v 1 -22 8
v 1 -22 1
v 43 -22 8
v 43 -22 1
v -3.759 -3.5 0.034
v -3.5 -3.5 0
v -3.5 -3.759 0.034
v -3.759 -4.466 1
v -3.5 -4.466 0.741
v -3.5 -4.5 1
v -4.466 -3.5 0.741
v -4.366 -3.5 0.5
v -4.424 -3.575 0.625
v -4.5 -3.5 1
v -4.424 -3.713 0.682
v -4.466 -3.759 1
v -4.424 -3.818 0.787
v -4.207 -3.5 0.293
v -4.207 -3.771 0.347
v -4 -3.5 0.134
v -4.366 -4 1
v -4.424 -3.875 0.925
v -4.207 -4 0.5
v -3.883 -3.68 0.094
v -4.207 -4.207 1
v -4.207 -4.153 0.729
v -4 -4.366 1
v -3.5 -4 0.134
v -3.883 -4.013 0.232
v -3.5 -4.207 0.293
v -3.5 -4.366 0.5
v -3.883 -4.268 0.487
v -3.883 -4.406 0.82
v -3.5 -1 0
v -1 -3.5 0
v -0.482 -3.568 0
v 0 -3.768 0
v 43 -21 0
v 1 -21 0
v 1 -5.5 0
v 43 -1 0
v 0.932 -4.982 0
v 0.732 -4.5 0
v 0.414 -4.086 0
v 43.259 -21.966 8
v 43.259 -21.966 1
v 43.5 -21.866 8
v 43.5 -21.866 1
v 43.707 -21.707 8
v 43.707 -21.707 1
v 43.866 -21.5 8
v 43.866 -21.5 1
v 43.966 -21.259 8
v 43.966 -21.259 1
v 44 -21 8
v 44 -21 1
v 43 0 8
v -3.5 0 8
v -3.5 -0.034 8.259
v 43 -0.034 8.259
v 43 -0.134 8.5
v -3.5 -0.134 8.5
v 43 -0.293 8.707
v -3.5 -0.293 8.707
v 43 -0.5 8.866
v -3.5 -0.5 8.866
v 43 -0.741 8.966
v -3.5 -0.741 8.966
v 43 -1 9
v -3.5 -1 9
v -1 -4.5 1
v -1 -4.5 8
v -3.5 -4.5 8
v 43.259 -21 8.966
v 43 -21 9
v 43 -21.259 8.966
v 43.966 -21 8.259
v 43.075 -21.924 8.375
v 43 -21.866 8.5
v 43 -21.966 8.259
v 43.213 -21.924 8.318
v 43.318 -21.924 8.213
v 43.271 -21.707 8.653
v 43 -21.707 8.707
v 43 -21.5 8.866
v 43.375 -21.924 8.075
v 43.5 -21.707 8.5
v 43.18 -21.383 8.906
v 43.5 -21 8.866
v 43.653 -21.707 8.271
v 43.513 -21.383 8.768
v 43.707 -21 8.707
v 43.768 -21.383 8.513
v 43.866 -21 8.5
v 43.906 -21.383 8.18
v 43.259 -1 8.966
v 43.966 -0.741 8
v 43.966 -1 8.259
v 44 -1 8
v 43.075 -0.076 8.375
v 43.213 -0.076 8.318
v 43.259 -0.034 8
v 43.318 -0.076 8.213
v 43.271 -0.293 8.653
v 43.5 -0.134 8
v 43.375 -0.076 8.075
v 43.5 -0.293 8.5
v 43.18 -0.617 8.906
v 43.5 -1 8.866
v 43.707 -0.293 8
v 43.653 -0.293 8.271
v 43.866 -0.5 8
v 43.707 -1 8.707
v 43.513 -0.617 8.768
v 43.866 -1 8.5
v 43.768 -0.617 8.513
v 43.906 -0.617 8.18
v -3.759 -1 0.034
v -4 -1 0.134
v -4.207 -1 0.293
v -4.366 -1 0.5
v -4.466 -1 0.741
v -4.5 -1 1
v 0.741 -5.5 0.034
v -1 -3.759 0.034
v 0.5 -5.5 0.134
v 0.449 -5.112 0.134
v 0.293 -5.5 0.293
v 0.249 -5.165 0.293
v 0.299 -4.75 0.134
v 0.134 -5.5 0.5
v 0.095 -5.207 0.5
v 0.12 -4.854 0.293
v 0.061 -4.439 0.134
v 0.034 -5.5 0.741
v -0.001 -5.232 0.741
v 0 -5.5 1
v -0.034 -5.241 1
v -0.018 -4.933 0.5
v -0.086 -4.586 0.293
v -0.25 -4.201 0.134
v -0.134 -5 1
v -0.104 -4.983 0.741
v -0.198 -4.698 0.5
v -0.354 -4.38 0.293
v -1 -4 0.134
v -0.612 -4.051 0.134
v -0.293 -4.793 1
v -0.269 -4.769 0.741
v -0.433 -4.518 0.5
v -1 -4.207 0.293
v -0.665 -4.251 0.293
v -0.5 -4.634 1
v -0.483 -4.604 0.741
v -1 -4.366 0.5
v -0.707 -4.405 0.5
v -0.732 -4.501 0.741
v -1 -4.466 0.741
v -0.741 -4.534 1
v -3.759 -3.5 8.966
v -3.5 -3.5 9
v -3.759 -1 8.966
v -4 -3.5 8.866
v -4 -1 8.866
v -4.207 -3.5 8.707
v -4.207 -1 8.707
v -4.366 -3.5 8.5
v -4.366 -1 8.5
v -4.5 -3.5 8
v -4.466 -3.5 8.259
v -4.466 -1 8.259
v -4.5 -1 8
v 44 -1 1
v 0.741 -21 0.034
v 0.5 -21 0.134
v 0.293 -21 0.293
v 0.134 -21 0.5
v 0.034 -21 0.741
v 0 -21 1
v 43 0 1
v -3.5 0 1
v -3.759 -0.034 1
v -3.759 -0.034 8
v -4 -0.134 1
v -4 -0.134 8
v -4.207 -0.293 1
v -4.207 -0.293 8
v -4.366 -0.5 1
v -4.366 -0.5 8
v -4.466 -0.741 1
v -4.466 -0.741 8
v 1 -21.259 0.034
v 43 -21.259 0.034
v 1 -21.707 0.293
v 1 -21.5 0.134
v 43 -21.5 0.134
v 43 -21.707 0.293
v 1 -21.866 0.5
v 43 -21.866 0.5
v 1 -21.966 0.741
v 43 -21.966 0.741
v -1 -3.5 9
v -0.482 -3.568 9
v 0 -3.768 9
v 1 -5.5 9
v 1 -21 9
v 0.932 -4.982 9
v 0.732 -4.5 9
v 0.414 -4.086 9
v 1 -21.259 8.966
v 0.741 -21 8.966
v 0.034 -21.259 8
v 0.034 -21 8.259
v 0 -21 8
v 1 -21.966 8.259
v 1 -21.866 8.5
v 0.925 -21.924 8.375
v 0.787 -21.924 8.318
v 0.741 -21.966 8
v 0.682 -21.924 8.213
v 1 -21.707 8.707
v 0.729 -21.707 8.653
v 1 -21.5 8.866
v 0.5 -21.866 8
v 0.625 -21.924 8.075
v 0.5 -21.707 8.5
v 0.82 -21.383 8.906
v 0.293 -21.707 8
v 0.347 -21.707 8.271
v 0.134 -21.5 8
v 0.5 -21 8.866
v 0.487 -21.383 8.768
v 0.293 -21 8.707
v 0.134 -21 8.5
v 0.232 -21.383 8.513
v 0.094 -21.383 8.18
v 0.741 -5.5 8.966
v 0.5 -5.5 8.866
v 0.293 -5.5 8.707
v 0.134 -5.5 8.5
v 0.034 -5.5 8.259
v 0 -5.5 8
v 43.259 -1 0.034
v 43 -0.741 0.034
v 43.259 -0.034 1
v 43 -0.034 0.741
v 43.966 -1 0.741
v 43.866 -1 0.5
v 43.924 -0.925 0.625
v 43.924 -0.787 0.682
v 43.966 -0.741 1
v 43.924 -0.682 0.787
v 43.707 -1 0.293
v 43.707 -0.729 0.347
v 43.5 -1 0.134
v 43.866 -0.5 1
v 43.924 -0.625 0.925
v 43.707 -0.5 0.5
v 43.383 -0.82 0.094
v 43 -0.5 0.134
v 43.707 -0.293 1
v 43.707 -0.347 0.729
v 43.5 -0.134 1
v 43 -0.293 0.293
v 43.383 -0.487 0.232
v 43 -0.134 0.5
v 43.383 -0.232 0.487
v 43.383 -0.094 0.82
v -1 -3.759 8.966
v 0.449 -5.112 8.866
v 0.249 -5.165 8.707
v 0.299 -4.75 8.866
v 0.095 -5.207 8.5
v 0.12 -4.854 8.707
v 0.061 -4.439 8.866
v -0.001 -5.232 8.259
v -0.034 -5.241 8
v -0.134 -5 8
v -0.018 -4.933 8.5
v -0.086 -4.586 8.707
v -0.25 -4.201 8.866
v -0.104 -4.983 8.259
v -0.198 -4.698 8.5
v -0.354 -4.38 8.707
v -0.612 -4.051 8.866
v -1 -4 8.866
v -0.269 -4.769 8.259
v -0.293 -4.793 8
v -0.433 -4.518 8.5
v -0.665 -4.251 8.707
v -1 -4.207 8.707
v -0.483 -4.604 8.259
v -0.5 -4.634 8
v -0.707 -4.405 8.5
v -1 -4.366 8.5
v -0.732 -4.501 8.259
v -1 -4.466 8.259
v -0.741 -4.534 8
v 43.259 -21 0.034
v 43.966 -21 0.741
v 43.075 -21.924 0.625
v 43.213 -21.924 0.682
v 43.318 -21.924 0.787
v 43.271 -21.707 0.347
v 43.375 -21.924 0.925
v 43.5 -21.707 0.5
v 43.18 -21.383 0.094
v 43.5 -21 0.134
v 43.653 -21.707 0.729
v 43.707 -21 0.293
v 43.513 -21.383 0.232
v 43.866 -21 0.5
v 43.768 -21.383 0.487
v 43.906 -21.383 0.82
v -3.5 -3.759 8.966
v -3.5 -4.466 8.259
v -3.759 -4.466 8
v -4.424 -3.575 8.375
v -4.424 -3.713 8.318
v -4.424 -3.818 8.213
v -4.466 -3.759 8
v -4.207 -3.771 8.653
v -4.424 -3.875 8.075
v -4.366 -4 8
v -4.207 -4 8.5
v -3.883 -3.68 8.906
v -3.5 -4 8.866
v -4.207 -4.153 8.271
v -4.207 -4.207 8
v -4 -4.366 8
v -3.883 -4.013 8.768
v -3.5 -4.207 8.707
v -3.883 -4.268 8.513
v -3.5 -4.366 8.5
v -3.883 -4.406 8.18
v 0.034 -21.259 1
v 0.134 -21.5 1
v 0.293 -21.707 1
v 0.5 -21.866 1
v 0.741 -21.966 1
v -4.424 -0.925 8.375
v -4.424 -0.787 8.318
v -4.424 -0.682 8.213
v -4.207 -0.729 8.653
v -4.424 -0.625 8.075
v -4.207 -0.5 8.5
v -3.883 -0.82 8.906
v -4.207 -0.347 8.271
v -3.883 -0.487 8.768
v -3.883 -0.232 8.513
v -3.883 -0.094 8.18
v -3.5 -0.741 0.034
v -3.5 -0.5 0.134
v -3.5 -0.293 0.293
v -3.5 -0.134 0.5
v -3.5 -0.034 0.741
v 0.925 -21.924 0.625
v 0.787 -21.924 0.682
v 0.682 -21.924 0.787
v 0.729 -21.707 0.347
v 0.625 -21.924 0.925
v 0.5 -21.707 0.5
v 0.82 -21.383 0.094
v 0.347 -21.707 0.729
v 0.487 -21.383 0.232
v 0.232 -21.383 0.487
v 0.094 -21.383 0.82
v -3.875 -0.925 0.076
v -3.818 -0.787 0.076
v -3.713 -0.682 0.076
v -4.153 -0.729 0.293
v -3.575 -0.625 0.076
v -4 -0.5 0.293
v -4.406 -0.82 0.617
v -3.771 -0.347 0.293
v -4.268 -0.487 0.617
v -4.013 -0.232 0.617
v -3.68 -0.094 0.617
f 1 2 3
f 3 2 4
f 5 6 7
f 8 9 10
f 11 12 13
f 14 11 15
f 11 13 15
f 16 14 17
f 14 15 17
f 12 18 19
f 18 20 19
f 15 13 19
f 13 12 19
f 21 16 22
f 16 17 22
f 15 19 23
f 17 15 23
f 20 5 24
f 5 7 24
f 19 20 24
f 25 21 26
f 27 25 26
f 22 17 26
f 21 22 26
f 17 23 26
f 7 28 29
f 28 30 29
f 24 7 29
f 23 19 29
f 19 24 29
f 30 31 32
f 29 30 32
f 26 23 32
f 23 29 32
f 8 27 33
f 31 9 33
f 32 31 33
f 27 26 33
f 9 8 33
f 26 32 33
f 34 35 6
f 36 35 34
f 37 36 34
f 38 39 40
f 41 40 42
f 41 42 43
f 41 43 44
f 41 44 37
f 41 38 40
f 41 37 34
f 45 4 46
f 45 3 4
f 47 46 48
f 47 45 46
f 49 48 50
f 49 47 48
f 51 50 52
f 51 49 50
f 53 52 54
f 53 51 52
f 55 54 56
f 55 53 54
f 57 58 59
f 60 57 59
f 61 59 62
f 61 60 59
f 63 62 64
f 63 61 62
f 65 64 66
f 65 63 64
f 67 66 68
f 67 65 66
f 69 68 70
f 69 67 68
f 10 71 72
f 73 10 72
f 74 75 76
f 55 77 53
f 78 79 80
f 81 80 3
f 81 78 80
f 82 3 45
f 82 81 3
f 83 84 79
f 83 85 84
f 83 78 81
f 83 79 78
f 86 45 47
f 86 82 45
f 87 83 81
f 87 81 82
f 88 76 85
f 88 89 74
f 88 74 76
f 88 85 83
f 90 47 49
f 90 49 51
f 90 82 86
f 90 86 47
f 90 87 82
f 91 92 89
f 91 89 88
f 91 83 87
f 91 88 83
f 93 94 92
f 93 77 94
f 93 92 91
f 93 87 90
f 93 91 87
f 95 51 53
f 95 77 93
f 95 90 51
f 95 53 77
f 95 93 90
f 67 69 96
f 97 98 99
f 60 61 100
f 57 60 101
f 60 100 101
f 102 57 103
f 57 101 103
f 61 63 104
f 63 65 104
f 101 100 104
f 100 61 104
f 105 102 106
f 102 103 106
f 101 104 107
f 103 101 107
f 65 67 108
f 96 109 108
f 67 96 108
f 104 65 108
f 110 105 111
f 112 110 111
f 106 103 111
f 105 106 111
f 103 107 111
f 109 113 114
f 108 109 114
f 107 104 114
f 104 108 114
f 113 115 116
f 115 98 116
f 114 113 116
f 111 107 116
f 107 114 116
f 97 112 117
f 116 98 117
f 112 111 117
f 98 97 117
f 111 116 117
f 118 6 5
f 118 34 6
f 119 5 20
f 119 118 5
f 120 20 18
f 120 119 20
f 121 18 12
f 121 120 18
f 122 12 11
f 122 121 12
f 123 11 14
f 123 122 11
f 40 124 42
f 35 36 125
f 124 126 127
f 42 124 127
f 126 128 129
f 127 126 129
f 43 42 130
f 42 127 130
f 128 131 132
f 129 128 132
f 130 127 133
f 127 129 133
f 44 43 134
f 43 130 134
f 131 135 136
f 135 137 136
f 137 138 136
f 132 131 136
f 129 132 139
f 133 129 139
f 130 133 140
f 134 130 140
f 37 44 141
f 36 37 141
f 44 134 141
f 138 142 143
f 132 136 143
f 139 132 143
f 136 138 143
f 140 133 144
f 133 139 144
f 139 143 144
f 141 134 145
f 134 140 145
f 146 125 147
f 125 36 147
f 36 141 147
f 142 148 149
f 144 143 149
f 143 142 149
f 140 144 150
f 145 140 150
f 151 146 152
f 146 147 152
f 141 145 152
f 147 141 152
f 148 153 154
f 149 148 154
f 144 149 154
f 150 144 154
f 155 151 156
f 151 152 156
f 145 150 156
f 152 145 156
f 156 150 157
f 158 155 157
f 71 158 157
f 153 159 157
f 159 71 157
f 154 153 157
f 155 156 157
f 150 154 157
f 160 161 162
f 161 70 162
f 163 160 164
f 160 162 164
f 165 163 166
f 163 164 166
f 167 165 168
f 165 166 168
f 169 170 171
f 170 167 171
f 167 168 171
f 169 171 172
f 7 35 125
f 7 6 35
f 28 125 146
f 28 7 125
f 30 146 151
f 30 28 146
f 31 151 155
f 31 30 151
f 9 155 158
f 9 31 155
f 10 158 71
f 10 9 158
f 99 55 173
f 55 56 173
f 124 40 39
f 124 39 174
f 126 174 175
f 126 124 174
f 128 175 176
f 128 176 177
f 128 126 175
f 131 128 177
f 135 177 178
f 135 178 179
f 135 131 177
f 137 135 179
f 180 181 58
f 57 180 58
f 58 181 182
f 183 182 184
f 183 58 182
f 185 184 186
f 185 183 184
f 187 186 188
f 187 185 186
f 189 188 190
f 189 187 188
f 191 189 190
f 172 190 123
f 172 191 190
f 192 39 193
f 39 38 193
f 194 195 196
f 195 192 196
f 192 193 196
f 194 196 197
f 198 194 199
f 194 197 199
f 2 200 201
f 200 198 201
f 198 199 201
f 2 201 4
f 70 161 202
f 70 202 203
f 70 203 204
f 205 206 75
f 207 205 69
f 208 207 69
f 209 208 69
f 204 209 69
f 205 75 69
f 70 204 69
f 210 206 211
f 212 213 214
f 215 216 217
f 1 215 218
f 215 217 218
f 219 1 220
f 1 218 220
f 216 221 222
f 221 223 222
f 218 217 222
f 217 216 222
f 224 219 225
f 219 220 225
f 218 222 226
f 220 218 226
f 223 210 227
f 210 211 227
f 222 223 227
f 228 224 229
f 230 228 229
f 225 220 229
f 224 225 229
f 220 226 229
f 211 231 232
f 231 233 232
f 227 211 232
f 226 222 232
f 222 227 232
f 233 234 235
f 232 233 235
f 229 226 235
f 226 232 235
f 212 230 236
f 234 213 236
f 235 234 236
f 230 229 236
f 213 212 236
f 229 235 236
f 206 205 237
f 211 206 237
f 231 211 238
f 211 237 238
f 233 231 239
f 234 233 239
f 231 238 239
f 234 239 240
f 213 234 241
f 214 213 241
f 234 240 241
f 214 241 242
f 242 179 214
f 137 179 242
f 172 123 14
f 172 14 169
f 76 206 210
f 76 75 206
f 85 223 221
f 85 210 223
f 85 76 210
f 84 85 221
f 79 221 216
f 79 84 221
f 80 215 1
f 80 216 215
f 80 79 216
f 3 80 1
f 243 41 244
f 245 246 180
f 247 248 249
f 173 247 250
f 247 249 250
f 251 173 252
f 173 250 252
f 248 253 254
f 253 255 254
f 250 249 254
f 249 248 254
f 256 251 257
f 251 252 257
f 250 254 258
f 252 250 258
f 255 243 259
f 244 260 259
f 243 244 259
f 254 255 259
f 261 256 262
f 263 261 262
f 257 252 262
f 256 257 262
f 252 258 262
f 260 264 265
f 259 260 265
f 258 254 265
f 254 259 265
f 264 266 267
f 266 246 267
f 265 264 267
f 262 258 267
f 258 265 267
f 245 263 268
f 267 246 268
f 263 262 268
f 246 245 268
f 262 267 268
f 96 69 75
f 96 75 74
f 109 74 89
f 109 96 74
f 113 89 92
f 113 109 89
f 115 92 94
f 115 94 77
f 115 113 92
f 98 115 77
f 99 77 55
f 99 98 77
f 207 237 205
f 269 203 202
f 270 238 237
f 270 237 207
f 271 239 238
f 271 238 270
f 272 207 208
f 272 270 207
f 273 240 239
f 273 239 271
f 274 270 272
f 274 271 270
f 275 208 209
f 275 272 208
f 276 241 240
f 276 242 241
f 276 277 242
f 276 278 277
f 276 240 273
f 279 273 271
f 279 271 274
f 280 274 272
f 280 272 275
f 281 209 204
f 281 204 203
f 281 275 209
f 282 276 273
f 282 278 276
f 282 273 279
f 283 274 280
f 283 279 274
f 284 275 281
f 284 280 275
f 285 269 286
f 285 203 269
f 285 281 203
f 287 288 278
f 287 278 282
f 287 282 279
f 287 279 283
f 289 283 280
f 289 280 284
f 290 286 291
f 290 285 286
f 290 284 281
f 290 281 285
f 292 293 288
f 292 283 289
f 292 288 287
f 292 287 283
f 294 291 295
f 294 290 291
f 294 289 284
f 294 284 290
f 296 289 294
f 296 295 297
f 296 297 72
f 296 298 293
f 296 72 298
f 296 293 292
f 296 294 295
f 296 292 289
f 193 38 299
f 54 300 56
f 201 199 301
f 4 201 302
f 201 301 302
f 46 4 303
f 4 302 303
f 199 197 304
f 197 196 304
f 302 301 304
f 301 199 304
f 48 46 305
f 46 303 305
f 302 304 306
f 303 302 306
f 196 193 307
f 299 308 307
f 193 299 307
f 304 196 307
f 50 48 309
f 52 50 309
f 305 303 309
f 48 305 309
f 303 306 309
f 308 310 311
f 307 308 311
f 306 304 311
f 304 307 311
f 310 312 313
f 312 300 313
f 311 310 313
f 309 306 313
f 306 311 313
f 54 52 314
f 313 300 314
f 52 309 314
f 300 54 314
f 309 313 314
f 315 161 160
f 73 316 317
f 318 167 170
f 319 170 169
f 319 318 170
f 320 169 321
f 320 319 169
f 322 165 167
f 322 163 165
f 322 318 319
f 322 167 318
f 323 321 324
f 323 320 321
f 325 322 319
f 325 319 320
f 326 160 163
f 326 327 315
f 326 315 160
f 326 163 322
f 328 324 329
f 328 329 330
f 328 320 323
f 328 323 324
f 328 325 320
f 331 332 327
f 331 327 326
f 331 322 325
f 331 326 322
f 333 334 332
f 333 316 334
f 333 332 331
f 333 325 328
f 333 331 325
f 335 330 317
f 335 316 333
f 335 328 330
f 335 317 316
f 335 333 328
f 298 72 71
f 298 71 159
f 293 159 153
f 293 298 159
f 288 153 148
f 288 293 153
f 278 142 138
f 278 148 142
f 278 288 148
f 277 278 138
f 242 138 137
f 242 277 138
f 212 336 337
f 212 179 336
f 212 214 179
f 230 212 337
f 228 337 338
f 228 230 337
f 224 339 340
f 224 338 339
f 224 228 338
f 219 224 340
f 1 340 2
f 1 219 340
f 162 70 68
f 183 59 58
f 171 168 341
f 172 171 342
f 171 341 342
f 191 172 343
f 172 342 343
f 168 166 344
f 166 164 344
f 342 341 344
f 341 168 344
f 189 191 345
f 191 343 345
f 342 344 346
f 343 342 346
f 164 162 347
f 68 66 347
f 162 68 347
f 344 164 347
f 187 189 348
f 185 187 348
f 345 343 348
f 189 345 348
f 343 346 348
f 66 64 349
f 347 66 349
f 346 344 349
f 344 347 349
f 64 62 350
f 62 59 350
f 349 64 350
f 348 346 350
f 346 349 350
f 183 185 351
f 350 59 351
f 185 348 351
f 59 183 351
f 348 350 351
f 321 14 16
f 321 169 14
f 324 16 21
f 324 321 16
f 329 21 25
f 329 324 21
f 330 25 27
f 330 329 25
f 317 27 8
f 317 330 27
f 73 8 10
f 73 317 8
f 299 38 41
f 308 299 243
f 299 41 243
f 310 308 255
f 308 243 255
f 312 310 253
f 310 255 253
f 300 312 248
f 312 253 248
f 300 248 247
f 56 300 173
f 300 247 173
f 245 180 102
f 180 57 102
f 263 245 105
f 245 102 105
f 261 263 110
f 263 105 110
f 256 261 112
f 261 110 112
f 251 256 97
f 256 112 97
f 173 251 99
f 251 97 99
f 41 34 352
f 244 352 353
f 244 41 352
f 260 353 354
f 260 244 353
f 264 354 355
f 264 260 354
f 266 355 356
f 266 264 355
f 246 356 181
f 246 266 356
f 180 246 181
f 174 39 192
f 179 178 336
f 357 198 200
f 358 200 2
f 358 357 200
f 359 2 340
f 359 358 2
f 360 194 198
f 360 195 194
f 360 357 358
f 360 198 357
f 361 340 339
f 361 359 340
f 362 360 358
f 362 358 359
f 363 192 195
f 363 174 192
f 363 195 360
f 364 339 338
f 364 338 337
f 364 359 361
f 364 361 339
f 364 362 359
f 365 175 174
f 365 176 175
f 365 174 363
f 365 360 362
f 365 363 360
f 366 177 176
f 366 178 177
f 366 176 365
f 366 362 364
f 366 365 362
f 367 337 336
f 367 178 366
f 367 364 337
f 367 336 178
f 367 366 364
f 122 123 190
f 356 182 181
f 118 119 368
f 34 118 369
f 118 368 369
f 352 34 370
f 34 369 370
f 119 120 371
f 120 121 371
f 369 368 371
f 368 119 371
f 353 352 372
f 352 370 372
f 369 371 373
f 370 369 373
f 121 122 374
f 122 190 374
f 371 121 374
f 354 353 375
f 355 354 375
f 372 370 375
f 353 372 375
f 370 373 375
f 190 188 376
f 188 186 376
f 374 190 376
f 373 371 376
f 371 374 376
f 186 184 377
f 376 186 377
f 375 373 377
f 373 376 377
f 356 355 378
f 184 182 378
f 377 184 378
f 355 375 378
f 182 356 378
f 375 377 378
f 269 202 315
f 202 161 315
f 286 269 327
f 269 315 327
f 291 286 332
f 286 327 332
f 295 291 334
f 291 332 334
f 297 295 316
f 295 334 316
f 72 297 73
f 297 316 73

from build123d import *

# Parameters (mm, degrees)
ESQUISSE1_W             = 44
ESQUISSE1_H             = 22
BOSS_EXTRU_1_DEPTH      = 9
ESQUISSE2_W             = 9
ESQUISSE2_H             = 4.5
BOSS_EXTRU_2_DEPTH      = 4.5
BOSS_EXTRU_2_DEPTH_BACK = 9
CONG_2_R                = 1


with BuildPart() as part:
    # Esquisse1 → Boss.-Extru.1 (new body)
    with BuildSketch(Plane.XY):
        with Locations((22, -11)):
            Rectangle(ESQUISSE1_W, ESQUISSE1_H)
    extrude(amount=BOSS_EXTRU_1_DEPTH)

    # Esquisse2 → Boss.-Extru.2 (add, two sides)
    with BuildSketch(Plane.ZY) as boss_extru_2_sk:
        with Locations((4.5, -2.25)):
            Rectangle(ESQUISSE2_W, ESQUISSE2_H)
    extrude(amount=BOSS_EXTRU_2_DEPTH)
    extrude(boss_extru_2_sk.sketch, amount=-BOSS_EXTRU_2_DEPTH_BACK)

    # Congé2
    cong_2_edges = [part.edges().sort_by_distance(p)[0] for p in [
        (44, -11, 9),
        (19.75, 0, 9),
        (0, -13.25, 0),
        (0, -13.25, 9),
        (-2.25, -4.5, 0),
        (-2.25, -4.5, 9),
        (0, -4.5, 4.5),
        (-4.5, -2.25, 9),
        (-4.5, 0, 4.5),
        (-4.5, -2.25, 0),
        (-4.5, -4.5, 4.5),
        (19.75, 0, 0),
        (44, -11, 0),
        (22, -22, 0),
        (22, -22, 9),
        (44, 0, 4.5),
        (44, -22, 4.5),
        (0, -22, 4.5),
    ]]
    fillet(cong_2_edges, radius=CONG_2_R)


solid = part.part
